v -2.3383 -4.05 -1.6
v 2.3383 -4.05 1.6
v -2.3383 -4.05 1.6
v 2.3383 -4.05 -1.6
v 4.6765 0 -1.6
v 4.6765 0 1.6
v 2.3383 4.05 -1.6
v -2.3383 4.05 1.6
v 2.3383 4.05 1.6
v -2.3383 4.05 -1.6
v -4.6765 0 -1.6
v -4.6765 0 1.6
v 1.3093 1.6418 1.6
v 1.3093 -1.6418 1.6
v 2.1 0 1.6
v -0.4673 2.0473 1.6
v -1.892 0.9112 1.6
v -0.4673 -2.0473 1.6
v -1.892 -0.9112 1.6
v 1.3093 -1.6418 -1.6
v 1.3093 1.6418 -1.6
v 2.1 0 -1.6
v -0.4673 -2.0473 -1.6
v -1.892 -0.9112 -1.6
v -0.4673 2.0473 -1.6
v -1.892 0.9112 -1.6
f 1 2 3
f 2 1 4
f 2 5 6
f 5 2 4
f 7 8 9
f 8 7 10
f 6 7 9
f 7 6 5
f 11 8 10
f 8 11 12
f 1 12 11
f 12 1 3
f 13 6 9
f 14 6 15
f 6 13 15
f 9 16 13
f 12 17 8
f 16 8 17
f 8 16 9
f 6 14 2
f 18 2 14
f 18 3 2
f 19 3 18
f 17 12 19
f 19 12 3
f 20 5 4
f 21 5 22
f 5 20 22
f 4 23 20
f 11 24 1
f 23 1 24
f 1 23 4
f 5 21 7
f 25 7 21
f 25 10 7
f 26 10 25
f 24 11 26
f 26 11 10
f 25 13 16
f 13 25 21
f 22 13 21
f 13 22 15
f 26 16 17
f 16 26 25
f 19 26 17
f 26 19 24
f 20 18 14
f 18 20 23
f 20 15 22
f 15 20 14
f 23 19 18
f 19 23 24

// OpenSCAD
// Parameters
thread_diameter = 4.0; //[2.0:8.0:0.1]
across_flats = 8.1; //[4.0:16.2:0.1]
thickness = 3.2; //[1.6:6.4:0.1]
chamfer_enabled = 1; //[0:1:1]
chamfer_size = 0.4; //[0.2:1.0:0.05]
hole_clearance = 0.2; //[0.0:0.6:0.05]
overlap = 0.8; //[0.5:2.0:0.1]

// Hex Nut - complete geometry
module hex_nut() {
  color("DimGray") {
    difference() {
      // Hexagonal body
      cylinder(h=thickness, r=(across_flats/2)/cos(30), $fn=6, center=true);
      // Central through-hole
      translate([0, 0, 0])
        cylinder(h=thickness + 2*overlap, r=(thread_diameter + hole_clearance)/2, center=true);
      
      // Chamfers
      if (chamfer_enabled) {
        translate([0, 0, thickness/2 - chamfer_size/2 + overlap/2])
          rotate([180, 0, 0])
          cylinder(h=chamfer_size, r1=(thread_diameter + hole_clearance)/2 + chamfer_size, r2=0, center=true);
        
        translate([0, 0, -thickness/2 + chamfer_size/2 - overlap/2])
          cylinder(h=chamfer_size, r1=(thread_diameter + hole_clearance)/2 + chamfer_size, r2=0, center=true);
      }
    }
  }
}

// Nut and Washer - complete geometry
module nut_and_washer() {
  hex_nut();
}

// Assembly
module assembly() {
  nut_and_washer();
}

assembly();
